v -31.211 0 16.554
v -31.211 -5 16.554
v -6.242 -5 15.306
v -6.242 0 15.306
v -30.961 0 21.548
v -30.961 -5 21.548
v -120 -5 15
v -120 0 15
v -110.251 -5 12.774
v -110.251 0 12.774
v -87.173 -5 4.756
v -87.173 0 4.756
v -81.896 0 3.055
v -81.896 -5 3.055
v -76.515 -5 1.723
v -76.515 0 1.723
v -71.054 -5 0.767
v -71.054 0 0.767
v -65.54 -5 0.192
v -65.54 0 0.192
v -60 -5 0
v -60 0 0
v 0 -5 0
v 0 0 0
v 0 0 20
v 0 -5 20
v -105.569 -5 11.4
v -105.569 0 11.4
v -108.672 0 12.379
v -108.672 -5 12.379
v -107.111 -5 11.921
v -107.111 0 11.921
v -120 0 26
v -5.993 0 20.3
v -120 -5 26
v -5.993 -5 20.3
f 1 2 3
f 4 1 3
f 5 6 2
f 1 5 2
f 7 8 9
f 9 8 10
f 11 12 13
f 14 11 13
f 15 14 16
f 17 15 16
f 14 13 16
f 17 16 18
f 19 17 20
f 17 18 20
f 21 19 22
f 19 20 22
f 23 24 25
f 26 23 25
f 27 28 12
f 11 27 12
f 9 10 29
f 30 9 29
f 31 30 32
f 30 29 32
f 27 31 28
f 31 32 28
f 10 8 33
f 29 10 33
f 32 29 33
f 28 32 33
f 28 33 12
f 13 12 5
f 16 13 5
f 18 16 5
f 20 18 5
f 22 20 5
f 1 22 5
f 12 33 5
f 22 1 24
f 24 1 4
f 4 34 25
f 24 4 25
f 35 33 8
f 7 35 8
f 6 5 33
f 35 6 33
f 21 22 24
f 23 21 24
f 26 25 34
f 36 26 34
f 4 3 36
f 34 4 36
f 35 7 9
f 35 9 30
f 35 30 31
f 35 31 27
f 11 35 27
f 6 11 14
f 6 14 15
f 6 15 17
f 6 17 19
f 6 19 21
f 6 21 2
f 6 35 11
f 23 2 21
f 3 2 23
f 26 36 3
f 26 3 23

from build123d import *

# Parameters (mm, degrees)
F1_DEPTH = 5
F3_DEPTH = 25


with BuildPart() as f1:
    # F0 (on Front) → F1 (new body)
    with BuildSketch(Plane.XZ):
        with BuildLine():
            Line((0, 20), (-120, 26))
            Line((-120, 26), (-120, 15))
            Line((-120, 15), (-110.250925, 12.773895))
            ThreePointArc((-110.250925, 12.773895), (-107.888962, 12.158173), (-105.568952, 11.399531))
            Line((-105.568952, 11.399531), (-87.172784, 4.756131))
            ThreePointArc((-87.172784, 4.756131), (-73.792942, 1.198003), (-60, 0))
            Line((-60, 0), (0, 0))
            Line((0, 0), (0, 20))
        make_face()
    extrude(amount=F1_DEPTH)

    # F2 (on face) → F3 (cut)
    with BuildSketch(Plane.XZ.offset(5)):
        Polygon((-6.242202, 15.305864), (-5.992514, 20.299626), (-30.961323, 21.548066), (-31.211011, 16.554304), align=None)
    extrude(amount=-F3_DEPTH, mode=Mode.SUBTRACT)


solid = f1.part
